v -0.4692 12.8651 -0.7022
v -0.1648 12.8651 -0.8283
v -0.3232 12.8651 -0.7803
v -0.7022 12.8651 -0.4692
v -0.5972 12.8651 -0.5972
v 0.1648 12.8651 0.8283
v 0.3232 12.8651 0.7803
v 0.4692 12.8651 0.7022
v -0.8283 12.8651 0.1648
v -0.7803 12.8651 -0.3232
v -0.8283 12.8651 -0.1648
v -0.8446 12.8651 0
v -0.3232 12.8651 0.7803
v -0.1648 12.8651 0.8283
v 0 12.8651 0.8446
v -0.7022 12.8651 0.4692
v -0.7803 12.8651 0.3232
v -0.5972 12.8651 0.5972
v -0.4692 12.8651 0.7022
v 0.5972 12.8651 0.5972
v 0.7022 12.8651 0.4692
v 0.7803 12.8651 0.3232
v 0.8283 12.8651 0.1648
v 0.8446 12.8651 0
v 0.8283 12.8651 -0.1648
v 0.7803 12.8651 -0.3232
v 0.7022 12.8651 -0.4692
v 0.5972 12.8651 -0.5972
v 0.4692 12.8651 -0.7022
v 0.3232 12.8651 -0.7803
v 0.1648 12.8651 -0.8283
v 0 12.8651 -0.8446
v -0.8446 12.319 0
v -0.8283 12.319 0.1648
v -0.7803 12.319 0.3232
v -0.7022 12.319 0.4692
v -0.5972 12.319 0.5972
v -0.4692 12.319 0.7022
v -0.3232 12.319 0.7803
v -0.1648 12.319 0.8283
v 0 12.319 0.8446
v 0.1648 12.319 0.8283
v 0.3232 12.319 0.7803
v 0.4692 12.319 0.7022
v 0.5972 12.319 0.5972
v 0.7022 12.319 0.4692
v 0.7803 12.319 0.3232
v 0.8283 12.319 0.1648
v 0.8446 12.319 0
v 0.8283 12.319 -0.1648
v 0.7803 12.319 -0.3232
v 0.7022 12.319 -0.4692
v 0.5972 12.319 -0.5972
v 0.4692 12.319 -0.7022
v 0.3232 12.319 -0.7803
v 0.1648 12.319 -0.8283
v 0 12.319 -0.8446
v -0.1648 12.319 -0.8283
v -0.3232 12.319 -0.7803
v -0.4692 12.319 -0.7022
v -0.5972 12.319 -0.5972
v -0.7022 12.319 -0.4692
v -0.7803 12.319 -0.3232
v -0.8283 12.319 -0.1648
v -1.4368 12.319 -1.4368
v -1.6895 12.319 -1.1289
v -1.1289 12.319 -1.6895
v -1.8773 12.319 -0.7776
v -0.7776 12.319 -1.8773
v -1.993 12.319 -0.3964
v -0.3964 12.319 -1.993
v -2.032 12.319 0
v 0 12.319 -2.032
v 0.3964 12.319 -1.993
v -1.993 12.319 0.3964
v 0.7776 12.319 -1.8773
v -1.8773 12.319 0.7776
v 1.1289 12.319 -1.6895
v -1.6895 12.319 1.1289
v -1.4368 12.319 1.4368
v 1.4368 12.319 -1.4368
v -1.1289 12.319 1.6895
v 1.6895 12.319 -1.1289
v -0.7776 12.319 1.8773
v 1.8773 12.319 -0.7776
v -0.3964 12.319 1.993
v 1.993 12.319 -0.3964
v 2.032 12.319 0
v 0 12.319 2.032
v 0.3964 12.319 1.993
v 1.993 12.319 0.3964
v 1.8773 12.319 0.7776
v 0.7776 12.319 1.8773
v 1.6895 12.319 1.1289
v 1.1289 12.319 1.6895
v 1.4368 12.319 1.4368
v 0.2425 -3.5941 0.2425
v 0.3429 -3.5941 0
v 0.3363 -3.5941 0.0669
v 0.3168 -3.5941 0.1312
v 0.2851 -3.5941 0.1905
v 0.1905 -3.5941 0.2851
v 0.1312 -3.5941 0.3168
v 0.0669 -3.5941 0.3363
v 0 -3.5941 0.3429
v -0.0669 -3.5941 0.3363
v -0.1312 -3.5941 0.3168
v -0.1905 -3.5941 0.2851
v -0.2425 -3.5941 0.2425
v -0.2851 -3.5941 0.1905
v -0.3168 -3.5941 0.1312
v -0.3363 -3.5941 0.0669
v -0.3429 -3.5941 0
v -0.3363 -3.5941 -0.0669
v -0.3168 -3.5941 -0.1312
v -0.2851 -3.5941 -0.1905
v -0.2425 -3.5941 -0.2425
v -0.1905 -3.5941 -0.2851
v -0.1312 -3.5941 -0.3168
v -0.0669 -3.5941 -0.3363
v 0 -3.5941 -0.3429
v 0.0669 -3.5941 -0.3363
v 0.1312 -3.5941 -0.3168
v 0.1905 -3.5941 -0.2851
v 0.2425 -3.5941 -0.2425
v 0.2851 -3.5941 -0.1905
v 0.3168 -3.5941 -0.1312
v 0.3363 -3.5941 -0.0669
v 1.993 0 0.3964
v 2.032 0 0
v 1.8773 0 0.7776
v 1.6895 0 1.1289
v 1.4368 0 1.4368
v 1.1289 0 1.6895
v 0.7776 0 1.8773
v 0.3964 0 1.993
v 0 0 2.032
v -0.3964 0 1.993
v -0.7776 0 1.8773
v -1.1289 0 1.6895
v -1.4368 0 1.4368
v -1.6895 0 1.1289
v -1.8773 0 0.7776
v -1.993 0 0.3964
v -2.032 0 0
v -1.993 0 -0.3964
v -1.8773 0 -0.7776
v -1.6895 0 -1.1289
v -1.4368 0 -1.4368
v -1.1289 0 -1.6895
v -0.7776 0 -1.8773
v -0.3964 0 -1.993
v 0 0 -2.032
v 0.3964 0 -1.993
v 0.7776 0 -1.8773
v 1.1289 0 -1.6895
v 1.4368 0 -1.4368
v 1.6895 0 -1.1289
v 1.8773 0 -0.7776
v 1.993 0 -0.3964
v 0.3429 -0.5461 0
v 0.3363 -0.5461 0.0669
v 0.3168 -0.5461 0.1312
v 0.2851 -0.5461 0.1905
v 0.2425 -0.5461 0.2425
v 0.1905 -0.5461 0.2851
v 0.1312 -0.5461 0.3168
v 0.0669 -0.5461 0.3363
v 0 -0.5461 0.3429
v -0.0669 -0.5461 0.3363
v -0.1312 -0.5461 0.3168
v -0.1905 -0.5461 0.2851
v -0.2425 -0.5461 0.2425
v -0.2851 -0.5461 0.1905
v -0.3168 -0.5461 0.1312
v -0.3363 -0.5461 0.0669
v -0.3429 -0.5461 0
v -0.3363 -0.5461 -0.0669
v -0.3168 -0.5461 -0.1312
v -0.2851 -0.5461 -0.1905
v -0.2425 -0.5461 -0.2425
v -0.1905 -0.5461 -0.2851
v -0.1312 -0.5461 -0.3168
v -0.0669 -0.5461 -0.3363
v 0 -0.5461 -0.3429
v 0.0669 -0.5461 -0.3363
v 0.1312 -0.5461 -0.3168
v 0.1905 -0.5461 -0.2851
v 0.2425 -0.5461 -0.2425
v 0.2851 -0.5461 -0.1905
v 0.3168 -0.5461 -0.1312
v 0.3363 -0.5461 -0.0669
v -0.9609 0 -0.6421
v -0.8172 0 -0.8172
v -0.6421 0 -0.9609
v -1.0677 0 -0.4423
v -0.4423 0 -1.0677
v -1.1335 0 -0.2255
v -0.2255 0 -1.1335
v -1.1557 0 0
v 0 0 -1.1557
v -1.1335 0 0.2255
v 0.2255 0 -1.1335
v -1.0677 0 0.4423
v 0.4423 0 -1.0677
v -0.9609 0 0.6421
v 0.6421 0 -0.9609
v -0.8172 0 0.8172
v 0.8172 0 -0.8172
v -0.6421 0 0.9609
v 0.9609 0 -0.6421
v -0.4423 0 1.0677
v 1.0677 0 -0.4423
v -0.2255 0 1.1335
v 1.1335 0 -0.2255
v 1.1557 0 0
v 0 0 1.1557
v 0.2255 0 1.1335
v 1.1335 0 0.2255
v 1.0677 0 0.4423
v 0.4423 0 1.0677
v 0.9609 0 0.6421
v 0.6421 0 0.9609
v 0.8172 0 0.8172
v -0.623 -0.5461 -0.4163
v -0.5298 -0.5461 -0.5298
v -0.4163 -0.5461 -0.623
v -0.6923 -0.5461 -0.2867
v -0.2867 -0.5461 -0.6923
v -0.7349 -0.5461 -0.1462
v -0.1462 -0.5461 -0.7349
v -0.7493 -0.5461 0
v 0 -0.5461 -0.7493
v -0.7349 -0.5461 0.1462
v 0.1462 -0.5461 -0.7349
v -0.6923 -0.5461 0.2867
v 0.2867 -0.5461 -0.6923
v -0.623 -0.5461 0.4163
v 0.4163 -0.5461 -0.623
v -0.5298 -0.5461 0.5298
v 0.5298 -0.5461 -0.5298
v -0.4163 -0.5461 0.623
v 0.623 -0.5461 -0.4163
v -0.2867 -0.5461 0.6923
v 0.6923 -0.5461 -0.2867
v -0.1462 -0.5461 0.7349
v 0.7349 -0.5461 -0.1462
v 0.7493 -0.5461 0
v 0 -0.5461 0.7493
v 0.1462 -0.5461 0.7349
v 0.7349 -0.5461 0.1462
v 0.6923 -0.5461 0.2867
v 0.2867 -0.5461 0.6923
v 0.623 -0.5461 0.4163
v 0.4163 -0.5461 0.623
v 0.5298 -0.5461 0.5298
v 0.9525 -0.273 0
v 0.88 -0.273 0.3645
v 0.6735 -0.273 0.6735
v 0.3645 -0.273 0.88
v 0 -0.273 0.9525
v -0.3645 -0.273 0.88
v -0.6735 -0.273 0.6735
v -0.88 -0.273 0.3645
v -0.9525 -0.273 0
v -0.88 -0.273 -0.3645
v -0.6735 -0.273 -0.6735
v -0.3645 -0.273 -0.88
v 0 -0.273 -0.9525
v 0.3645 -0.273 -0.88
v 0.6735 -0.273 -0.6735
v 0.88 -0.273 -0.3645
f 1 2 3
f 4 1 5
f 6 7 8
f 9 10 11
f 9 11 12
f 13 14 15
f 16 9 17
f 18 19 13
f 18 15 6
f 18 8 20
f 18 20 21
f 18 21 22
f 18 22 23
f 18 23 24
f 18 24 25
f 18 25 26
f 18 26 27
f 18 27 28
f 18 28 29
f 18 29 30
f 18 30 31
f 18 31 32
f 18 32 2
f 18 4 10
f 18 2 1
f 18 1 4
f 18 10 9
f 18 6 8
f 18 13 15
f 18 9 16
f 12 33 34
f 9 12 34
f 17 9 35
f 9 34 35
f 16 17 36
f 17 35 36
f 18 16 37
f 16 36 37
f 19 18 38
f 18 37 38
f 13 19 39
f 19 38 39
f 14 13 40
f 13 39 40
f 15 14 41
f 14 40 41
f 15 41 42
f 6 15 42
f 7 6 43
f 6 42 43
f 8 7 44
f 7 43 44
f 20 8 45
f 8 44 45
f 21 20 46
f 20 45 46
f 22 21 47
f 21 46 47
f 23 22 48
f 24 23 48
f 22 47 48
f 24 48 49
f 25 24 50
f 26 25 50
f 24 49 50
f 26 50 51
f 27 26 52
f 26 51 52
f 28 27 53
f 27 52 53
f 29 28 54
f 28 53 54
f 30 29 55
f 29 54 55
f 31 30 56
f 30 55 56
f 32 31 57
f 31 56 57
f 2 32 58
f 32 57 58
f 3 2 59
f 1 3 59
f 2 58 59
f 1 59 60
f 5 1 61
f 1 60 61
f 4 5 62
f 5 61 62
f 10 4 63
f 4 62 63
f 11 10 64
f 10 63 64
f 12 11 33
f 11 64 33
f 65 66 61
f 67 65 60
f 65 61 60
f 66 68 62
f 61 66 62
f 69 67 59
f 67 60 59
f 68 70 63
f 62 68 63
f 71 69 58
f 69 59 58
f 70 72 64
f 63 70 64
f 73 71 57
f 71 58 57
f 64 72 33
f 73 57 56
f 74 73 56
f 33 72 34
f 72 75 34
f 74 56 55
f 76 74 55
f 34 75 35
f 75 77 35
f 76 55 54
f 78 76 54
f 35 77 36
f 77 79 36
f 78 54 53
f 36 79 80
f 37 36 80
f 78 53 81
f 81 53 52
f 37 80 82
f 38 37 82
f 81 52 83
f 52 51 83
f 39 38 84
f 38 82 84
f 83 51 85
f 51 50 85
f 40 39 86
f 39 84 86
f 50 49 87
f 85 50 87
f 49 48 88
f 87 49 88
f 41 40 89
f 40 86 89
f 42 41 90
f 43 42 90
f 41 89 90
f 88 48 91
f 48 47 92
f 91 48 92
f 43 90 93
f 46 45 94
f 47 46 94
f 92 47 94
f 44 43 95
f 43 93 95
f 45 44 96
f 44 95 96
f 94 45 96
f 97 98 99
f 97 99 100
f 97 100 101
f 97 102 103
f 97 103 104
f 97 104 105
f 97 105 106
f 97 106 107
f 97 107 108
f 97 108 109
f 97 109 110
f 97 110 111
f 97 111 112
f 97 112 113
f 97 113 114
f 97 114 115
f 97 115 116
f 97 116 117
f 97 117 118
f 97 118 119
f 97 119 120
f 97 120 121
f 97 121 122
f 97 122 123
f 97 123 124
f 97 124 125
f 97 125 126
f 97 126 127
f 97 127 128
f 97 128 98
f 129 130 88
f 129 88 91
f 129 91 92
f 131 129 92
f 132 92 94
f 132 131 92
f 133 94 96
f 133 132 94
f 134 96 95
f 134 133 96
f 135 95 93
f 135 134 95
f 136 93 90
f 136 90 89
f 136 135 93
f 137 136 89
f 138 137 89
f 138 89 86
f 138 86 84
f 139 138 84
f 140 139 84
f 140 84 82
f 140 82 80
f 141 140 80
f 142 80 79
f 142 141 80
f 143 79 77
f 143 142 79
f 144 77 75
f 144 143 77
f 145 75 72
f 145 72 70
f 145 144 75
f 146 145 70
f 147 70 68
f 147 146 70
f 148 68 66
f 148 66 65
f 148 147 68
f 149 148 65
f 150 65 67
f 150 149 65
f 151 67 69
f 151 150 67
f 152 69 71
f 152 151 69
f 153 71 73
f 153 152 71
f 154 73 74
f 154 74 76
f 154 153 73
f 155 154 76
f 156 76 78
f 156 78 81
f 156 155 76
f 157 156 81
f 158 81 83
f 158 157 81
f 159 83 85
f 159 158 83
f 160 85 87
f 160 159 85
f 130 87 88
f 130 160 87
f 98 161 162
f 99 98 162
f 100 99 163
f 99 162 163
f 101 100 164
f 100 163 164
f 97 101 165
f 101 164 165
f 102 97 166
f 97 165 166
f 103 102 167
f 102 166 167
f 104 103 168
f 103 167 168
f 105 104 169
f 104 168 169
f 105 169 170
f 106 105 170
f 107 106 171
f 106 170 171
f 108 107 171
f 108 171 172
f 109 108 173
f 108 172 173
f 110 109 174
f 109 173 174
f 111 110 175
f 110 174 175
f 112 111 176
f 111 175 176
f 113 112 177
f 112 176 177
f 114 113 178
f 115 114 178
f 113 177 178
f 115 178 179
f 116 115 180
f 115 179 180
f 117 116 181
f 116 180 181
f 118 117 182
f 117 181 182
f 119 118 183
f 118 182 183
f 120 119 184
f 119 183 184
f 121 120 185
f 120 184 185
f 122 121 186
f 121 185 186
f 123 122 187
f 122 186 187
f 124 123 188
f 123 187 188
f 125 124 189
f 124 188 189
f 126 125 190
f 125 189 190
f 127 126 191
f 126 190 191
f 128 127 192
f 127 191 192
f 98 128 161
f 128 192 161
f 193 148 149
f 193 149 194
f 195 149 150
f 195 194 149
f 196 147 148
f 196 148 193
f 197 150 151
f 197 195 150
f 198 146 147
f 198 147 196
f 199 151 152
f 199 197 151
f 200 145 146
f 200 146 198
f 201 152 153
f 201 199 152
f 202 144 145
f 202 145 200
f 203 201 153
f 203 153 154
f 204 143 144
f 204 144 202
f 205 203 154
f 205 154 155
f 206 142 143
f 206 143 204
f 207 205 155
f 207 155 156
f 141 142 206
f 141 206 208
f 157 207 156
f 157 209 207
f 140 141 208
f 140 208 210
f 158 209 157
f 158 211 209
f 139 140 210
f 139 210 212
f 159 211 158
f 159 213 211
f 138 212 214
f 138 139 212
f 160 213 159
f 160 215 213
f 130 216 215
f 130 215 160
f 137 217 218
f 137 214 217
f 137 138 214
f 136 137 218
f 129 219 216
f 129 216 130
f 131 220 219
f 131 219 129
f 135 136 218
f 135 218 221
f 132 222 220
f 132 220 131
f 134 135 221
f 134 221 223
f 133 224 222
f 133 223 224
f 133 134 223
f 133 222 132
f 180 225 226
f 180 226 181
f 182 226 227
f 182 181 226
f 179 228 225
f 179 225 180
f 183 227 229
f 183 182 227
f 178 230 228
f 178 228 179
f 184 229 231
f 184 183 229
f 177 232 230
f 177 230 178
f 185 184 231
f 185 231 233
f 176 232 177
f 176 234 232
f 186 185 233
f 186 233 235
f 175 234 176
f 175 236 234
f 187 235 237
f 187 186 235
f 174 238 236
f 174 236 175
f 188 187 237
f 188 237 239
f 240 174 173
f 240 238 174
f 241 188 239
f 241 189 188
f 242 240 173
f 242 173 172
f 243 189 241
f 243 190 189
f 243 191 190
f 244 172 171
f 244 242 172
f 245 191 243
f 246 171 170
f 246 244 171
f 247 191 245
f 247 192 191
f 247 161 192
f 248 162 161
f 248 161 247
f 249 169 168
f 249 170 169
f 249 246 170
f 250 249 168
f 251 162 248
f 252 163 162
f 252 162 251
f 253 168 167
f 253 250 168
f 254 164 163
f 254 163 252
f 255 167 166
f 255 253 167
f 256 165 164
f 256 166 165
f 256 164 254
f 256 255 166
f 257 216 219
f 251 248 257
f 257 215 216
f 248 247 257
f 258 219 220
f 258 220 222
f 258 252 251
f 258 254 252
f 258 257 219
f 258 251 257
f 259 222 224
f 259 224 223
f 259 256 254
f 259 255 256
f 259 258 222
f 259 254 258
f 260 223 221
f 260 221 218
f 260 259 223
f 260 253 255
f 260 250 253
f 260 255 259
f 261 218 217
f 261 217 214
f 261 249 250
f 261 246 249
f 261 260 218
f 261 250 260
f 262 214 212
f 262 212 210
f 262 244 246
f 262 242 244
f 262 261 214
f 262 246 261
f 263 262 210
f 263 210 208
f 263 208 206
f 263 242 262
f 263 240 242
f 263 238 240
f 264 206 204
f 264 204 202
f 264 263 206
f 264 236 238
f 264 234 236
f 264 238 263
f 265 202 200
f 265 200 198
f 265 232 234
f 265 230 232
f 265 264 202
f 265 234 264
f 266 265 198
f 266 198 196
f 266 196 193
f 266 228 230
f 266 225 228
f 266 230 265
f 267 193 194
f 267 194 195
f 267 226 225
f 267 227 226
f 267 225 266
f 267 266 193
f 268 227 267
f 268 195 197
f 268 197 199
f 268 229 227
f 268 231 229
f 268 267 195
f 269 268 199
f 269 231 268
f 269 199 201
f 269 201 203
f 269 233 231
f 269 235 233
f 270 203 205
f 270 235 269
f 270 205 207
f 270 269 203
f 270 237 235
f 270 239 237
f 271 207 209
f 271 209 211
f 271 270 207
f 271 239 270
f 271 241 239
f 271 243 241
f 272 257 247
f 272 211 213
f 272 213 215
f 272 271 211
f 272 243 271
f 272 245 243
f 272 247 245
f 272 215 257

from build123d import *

# Parameters (mm, degrees)
F0_R     = 2.032
F1_DEPTH = 12.319
F2_R     = 0.84455
F3_DEPTH = 0.5461
F4_R     = 1.1557
F6_R     = 0.7493
F8_R     = 0.3429
F9_DEPTH = 3.048


with BuildPart() as f1:
    # F0 (on Front) → F1 (new body)
    with BuildSketch(Plane.XZ):
        Circle(F0_R)
    extrude(amount=-F1_DEPTH)

    # F2 (on face) → F3 (join)
    with BuildSketch(Plane(origin=(0, 12.319, 0), x_dir=(-1, 0, 0), z_dir=(0, 1, 0))):
        Circle(F2_R)
    extrude(amount=F3_DEPTH)

    # F4 (on face) → F7 section 0
    with BuildSketch(Plane.XZ):
        Circle(F4_R)
    # F6 (on offset) → F7 section 1
    with BuildSketch(Plane.XZ.offset(0.5461)):
        Circle(F6_R)
    loft()

    # F8 (on face) → F9 (join)
    with BuildSketch(Plane.XZ.offset(0.5461)):
        Circle(F8_R)
    extrude(amount=F9_DEPTH)


solid = f1.part
